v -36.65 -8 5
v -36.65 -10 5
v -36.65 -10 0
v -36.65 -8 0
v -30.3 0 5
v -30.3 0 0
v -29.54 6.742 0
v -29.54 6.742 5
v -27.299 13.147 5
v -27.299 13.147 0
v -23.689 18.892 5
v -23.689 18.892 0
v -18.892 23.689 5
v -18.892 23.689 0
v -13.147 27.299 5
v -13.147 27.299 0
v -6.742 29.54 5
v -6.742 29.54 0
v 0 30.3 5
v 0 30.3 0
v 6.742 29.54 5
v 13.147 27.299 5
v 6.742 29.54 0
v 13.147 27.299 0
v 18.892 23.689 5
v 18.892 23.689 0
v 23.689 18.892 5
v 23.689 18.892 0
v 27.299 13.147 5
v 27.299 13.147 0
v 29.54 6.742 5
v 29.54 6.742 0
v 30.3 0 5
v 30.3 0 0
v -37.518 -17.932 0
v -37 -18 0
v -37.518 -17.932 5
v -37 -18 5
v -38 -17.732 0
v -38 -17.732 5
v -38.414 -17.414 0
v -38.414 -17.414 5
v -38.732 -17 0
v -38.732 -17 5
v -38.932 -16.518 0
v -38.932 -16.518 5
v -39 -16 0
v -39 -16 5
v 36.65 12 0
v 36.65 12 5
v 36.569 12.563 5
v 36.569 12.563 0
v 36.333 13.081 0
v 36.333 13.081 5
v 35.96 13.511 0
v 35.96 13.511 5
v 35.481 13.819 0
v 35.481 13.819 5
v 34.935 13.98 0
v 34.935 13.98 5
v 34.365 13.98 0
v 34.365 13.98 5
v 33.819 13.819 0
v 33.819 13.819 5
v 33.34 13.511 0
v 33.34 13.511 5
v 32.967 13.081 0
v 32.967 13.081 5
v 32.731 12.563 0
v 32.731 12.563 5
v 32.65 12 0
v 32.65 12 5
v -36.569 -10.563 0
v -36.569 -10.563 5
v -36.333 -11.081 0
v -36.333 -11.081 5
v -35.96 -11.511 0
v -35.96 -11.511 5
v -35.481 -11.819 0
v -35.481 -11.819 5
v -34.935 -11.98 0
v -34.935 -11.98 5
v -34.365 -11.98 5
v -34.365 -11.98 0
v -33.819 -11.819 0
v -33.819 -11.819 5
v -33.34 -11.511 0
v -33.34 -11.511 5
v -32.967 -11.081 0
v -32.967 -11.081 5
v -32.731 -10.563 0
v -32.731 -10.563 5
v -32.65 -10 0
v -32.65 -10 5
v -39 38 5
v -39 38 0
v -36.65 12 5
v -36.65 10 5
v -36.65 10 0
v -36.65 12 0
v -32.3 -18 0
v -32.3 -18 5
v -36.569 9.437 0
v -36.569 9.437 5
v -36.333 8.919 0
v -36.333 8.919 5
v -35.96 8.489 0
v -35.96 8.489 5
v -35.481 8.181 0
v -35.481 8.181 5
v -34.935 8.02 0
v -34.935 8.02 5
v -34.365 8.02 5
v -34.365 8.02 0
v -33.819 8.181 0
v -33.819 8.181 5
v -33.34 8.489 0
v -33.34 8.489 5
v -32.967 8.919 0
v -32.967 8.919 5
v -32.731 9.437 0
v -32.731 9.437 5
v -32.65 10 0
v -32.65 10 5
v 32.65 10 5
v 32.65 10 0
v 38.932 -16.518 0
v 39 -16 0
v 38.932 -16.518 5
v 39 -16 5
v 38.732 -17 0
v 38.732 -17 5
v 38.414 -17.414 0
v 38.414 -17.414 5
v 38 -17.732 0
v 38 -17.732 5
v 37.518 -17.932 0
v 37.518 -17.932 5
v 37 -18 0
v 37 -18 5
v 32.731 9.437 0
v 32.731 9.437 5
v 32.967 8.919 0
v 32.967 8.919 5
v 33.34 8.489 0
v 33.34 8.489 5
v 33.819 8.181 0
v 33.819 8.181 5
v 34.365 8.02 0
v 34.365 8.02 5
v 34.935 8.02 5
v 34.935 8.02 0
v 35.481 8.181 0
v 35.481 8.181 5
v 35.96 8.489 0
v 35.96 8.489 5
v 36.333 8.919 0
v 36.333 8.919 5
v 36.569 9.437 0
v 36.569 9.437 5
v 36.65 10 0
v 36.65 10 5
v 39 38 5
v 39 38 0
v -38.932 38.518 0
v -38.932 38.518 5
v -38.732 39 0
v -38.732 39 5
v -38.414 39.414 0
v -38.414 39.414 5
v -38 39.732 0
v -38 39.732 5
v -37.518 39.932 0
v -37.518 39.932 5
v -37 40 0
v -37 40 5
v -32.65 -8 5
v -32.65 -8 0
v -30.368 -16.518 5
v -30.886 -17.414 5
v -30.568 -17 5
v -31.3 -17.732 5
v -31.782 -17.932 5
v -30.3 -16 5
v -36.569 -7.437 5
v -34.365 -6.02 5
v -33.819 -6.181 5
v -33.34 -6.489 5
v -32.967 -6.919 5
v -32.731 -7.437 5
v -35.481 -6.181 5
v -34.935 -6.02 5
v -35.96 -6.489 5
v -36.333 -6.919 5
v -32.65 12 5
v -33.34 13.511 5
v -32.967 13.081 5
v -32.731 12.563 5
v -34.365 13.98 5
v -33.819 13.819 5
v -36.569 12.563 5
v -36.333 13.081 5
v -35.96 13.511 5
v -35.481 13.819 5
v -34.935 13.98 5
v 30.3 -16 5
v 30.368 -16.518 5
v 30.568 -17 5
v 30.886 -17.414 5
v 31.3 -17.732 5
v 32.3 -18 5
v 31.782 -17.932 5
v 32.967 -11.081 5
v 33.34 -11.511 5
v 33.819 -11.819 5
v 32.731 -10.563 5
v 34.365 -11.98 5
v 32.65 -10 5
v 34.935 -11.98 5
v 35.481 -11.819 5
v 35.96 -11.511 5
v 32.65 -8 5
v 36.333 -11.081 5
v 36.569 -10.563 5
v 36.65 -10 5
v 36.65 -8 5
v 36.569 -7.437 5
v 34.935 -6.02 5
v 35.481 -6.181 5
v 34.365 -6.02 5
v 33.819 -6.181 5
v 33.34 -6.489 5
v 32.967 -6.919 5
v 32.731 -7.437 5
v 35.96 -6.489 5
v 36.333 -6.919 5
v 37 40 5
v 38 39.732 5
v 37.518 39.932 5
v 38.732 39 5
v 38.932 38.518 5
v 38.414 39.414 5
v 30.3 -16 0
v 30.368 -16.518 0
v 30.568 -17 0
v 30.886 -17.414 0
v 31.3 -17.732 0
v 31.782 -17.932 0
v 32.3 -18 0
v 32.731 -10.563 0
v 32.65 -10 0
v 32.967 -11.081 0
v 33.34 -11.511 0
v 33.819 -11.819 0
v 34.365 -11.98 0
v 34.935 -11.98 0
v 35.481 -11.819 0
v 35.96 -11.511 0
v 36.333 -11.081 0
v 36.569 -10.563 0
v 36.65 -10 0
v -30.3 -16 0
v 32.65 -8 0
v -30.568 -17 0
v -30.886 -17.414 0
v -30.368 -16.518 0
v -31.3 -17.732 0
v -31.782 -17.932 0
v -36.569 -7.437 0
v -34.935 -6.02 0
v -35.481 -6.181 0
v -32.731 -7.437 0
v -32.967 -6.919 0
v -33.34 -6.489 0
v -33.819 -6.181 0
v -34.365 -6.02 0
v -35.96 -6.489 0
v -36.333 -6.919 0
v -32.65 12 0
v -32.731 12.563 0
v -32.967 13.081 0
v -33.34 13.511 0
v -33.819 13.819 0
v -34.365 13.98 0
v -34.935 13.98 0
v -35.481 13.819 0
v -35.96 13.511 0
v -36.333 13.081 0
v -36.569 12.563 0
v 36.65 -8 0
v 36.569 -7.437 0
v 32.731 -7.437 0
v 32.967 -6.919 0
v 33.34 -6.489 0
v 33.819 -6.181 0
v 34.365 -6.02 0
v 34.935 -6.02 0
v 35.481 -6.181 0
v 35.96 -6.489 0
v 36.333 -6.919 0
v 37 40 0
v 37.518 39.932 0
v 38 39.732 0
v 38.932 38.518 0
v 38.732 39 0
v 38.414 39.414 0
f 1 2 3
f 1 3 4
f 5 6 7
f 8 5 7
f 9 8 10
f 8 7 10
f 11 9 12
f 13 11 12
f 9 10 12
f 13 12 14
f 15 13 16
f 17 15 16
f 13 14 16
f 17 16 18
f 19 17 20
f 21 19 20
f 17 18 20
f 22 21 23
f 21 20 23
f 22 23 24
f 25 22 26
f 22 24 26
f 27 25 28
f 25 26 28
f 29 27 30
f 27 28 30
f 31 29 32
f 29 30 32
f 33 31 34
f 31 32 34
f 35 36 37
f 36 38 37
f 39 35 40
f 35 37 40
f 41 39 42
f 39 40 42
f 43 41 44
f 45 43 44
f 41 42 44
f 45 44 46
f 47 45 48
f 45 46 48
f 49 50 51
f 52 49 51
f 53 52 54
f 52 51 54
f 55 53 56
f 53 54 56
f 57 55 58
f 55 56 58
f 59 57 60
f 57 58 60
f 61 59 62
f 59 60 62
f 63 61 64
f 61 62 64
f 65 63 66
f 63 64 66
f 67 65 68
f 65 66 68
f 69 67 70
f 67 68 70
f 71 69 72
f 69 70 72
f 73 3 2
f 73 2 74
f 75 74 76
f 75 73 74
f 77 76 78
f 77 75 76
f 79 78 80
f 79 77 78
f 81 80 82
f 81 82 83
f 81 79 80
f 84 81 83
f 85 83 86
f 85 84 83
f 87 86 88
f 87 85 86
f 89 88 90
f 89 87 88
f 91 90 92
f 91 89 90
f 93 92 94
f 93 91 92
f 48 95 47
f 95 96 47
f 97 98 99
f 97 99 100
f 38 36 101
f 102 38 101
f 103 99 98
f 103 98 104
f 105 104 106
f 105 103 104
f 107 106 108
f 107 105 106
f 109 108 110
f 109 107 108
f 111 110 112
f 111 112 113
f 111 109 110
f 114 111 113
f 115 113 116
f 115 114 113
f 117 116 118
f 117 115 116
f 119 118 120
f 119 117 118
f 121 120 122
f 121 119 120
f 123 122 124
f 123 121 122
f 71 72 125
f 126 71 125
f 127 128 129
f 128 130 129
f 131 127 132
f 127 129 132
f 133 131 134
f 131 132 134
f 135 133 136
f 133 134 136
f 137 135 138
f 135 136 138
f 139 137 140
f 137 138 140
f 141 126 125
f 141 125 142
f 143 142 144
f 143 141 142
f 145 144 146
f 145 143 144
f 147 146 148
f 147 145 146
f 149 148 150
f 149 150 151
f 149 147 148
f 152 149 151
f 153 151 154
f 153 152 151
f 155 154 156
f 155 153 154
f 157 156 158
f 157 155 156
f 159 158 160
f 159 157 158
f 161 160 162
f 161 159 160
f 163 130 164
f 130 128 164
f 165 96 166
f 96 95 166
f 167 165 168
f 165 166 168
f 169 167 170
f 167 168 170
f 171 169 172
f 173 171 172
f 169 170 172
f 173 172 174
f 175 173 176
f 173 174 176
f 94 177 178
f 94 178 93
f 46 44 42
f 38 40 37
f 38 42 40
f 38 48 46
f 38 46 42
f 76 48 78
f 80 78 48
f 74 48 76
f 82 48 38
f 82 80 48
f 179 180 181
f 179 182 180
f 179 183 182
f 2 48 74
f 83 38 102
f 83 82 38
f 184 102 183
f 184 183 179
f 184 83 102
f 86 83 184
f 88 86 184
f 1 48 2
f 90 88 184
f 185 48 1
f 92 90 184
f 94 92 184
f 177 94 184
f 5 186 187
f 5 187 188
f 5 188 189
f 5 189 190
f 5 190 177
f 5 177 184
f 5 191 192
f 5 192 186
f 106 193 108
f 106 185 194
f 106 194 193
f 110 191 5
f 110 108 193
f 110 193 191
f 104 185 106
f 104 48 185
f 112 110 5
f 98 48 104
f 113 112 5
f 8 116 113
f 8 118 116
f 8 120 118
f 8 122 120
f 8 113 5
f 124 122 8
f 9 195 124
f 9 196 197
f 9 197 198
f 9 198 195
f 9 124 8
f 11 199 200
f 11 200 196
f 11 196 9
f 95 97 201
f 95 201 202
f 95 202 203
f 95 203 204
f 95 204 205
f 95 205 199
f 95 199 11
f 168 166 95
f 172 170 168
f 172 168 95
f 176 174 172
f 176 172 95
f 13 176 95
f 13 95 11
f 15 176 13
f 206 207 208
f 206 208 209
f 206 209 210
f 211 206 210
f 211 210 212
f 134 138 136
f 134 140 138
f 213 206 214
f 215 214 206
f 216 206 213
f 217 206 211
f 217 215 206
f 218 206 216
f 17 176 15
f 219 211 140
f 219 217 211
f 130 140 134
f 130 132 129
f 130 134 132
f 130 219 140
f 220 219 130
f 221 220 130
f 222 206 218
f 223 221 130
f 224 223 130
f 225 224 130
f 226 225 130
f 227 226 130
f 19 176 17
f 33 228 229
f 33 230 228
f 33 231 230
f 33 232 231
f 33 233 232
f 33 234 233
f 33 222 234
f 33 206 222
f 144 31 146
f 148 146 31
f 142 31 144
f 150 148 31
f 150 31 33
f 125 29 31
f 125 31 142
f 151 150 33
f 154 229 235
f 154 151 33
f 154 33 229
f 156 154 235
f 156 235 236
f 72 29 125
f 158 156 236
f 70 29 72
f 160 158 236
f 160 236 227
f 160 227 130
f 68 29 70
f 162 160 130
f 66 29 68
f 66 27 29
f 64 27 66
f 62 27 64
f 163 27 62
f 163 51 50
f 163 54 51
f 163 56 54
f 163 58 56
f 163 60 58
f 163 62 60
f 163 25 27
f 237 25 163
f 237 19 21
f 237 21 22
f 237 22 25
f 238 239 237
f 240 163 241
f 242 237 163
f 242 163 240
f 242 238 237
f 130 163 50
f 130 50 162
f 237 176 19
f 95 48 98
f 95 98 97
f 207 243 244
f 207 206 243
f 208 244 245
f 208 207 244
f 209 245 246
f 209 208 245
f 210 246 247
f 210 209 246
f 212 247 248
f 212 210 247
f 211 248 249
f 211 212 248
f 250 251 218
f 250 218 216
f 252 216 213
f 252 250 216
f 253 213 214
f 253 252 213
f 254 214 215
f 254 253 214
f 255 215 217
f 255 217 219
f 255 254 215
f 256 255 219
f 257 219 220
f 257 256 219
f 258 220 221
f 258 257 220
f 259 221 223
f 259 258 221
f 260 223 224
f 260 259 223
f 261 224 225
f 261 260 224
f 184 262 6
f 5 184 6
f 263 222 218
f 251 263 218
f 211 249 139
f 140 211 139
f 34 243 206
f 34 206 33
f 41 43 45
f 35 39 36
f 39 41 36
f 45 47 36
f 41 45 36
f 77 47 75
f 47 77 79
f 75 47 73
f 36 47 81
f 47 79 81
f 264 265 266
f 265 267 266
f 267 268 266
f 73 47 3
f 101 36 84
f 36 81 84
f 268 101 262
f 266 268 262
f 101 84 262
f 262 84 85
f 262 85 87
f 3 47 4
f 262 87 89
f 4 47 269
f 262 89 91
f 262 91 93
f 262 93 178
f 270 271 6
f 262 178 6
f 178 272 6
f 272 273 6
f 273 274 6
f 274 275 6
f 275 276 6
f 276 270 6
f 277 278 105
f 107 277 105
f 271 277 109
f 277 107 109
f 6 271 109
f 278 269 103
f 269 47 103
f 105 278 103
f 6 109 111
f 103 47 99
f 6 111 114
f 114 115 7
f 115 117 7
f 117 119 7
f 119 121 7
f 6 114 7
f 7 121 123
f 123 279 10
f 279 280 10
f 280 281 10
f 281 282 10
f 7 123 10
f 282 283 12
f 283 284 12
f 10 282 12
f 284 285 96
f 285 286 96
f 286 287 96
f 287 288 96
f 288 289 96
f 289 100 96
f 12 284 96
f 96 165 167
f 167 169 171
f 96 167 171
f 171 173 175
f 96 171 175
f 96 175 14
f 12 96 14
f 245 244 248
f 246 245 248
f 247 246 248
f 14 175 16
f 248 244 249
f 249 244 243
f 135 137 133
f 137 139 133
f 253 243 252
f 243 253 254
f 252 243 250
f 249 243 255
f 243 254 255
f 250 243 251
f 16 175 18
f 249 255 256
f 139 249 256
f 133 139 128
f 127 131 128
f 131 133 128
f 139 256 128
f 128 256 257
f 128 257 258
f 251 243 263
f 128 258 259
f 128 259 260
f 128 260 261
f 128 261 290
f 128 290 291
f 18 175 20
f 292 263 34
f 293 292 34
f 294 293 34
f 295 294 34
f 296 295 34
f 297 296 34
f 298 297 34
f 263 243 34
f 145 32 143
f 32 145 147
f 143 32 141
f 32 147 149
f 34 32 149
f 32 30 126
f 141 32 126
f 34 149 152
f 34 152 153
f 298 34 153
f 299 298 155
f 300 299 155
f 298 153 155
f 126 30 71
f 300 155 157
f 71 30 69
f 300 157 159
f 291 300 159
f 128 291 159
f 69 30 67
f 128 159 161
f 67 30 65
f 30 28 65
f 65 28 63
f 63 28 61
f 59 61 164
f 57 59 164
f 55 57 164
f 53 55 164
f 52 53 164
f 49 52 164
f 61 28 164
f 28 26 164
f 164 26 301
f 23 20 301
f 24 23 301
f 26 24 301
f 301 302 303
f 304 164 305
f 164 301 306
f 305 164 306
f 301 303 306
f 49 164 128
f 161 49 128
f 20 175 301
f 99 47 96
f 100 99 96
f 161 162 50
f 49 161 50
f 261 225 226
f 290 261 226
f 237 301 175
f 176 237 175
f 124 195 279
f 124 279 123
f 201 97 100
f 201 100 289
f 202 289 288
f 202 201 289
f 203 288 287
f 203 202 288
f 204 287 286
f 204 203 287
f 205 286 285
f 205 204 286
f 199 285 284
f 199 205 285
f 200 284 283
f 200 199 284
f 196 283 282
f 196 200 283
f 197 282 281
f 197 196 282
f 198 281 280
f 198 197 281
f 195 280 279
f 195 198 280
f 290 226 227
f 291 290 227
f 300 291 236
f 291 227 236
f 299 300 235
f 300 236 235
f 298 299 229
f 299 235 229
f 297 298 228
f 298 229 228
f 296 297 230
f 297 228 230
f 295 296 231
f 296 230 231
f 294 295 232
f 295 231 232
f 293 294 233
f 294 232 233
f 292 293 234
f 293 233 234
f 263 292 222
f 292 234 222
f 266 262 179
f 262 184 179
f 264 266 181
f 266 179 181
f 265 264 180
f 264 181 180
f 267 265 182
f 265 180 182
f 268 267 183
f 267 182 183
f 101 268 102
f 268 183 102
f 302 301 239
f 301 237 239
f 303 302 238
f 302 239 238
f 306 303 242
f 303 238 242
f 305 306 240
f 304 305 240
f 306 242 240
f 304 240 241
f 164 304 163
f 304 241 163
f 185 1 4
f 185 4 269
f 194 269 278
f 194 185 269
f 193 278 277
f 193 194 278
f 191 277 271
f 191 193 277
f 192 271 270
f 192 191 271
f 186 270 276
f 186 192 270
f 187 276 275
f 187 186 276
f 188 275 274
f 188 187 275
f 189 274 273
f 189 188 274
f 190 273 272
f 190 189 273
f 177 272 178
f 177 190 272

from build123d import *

# Parameters (mm, degrees)
SKETCH_1_R          = 2
SKETCH_1_W          = 8.7
SKETCH_1_H          = 18
EXTRUDE_1_DEPTH     = 5
FILLET_1_R          = 2
CUT_EXTRUDE_1_REACH = 58.089


with BuildPart() as part:
    # 草图1 → 凸台-拉伸1 (new body)
    # profile 1 of 3: a face of its own
    with BuildSketch(Plane.XY):
        with BuildLine():
            Line((39, 40), (-39, 40))
            Line((-39, 40), (-39, 0))
            Line((-39, 0), (-30.3, 0))
            ThreePointArc((-30.3, 0), (0, 30.3), (30.3, 0))
            Line((30.3, 0), (39, 0))
            Line((39, 0), (39, 40))
        make_face()
        with Locations((-34.65, 10)):
            Circle(SKETCH_1_R, mode=Mode.SUBTRACT)
        with Locations((34.65, 10)):
            Circle(SKETCH_1_R, mode=Mode.SUBTRACT)
    # profile 2 of 3: a face of its own
    with BuildSketch(Plane.XY):
        with Locations((-34.65, -9)):
            Rectangle(SKETCH_1_W, SKETCH_1_H)
        with Locations((-34.65, -10)):
            Circle(SKETCH_1_R, mode=Mode.SUBTRACT)
    # profile 3 of 3: a face of its own
    with BuildSketch(Plane.XY):
        with Locations((34.65, -9)):
            Rectangle(SKETCH_1_W, SKETCH_1_H)
        with Locations((34.65, -10)):
            Circle(SKETCH_1_R, mode=Mode.SUBTRACT)
    extrude(amount=EXTRUDE_1_DEPTH)

    # 圆角1
    fillet_1_edges = [part.edges().sort_by_distance(p)[0] for p in [
        (-30.3, -18, 2.5),
        (-39, -18, 2.5),
        (-39, 40, 2.5),
        (39, 40, 2.5),
        (39, -18, 2.5),
        (30.3, -18, 2.5),
    ]]
    fillet(fillet_1_edges, radius=FILLET_1_R)

    # 草图2 → 切除-拉伸1 (cut, up to next)
    with BuildSketch(Plane.XY.offset(5), mode=Mode.PRIVATE) as cut_extrude_1_sk1:
        with BuildLine():
            Line((-36.65, 10), (-36.65, 12))
            ThreePointArc((-36.65, 12), (-34.65, 14), (-32.65, 12))
            Line((-32.65, 12), (-32.65, 10))
            Line((-32.65, 10), (-36.65, 10))
        make_face()
    cut_extrude_1_tool1 = extrude(cut_extrude_1_sk1.sketch, amount=-CUT_EXTRUDE_1_REACH, mode=Mode.PRIVATE) & part.part
    # 草图2 → 切除-拉伸1 (cut, up to next)
    with BuildSketch(Plane.XY.offset(5), mode=Mode.PRIVATE) as cut_extrude_1_sk2:
        with BuildLine():
            Line((-36.65, -10), (-36.65, -8))
            ThreePointArc((-36.65, -8), (-34.65, -6), (-32.65, -8))
            Line((-32.65, -8), (-32.65, -10))
            Line((-32.65, -10), (-36.65, -10))
        make_face()
    cut_extrude_1_tool2 = extrude(cut_extrude_1_sk2.sketch, amount=-CUT_EXTRUDE_1_REACH, mode=Mode.PRIVATE) & part.part
    cut_extrude_1_1 = cut_extrude_1_tool1.solids().sort_by_distance((-34.65, 11.8133, 5))[0]
    add(cut_extrude_1_1, mode=Mode.SUBTRACT)
    cut_extrude_1_2 = cut_extrude_1_tool2.solids().sort_by_distance((-34.65, -8.1867, 5))[0]
    add(cut_extrude_1_2, mode=Mode.SUBTRACT)
    cut_extrude_1 = cut_extrude_1_1 + cut_extrude_1_2  # 切除-拉伸1 as one shape, for the pattern or mirror that repeats it

    # 镜向1: 切除-拉伸1 across plane
    add(cut_extrude_1.mirror(Plane(origin=(0, 0, 0), x_dir=(0, 0, 1), z_dir=(1, 0, 0))), mode=Mode.SUBTRACT)


solid = part.part
